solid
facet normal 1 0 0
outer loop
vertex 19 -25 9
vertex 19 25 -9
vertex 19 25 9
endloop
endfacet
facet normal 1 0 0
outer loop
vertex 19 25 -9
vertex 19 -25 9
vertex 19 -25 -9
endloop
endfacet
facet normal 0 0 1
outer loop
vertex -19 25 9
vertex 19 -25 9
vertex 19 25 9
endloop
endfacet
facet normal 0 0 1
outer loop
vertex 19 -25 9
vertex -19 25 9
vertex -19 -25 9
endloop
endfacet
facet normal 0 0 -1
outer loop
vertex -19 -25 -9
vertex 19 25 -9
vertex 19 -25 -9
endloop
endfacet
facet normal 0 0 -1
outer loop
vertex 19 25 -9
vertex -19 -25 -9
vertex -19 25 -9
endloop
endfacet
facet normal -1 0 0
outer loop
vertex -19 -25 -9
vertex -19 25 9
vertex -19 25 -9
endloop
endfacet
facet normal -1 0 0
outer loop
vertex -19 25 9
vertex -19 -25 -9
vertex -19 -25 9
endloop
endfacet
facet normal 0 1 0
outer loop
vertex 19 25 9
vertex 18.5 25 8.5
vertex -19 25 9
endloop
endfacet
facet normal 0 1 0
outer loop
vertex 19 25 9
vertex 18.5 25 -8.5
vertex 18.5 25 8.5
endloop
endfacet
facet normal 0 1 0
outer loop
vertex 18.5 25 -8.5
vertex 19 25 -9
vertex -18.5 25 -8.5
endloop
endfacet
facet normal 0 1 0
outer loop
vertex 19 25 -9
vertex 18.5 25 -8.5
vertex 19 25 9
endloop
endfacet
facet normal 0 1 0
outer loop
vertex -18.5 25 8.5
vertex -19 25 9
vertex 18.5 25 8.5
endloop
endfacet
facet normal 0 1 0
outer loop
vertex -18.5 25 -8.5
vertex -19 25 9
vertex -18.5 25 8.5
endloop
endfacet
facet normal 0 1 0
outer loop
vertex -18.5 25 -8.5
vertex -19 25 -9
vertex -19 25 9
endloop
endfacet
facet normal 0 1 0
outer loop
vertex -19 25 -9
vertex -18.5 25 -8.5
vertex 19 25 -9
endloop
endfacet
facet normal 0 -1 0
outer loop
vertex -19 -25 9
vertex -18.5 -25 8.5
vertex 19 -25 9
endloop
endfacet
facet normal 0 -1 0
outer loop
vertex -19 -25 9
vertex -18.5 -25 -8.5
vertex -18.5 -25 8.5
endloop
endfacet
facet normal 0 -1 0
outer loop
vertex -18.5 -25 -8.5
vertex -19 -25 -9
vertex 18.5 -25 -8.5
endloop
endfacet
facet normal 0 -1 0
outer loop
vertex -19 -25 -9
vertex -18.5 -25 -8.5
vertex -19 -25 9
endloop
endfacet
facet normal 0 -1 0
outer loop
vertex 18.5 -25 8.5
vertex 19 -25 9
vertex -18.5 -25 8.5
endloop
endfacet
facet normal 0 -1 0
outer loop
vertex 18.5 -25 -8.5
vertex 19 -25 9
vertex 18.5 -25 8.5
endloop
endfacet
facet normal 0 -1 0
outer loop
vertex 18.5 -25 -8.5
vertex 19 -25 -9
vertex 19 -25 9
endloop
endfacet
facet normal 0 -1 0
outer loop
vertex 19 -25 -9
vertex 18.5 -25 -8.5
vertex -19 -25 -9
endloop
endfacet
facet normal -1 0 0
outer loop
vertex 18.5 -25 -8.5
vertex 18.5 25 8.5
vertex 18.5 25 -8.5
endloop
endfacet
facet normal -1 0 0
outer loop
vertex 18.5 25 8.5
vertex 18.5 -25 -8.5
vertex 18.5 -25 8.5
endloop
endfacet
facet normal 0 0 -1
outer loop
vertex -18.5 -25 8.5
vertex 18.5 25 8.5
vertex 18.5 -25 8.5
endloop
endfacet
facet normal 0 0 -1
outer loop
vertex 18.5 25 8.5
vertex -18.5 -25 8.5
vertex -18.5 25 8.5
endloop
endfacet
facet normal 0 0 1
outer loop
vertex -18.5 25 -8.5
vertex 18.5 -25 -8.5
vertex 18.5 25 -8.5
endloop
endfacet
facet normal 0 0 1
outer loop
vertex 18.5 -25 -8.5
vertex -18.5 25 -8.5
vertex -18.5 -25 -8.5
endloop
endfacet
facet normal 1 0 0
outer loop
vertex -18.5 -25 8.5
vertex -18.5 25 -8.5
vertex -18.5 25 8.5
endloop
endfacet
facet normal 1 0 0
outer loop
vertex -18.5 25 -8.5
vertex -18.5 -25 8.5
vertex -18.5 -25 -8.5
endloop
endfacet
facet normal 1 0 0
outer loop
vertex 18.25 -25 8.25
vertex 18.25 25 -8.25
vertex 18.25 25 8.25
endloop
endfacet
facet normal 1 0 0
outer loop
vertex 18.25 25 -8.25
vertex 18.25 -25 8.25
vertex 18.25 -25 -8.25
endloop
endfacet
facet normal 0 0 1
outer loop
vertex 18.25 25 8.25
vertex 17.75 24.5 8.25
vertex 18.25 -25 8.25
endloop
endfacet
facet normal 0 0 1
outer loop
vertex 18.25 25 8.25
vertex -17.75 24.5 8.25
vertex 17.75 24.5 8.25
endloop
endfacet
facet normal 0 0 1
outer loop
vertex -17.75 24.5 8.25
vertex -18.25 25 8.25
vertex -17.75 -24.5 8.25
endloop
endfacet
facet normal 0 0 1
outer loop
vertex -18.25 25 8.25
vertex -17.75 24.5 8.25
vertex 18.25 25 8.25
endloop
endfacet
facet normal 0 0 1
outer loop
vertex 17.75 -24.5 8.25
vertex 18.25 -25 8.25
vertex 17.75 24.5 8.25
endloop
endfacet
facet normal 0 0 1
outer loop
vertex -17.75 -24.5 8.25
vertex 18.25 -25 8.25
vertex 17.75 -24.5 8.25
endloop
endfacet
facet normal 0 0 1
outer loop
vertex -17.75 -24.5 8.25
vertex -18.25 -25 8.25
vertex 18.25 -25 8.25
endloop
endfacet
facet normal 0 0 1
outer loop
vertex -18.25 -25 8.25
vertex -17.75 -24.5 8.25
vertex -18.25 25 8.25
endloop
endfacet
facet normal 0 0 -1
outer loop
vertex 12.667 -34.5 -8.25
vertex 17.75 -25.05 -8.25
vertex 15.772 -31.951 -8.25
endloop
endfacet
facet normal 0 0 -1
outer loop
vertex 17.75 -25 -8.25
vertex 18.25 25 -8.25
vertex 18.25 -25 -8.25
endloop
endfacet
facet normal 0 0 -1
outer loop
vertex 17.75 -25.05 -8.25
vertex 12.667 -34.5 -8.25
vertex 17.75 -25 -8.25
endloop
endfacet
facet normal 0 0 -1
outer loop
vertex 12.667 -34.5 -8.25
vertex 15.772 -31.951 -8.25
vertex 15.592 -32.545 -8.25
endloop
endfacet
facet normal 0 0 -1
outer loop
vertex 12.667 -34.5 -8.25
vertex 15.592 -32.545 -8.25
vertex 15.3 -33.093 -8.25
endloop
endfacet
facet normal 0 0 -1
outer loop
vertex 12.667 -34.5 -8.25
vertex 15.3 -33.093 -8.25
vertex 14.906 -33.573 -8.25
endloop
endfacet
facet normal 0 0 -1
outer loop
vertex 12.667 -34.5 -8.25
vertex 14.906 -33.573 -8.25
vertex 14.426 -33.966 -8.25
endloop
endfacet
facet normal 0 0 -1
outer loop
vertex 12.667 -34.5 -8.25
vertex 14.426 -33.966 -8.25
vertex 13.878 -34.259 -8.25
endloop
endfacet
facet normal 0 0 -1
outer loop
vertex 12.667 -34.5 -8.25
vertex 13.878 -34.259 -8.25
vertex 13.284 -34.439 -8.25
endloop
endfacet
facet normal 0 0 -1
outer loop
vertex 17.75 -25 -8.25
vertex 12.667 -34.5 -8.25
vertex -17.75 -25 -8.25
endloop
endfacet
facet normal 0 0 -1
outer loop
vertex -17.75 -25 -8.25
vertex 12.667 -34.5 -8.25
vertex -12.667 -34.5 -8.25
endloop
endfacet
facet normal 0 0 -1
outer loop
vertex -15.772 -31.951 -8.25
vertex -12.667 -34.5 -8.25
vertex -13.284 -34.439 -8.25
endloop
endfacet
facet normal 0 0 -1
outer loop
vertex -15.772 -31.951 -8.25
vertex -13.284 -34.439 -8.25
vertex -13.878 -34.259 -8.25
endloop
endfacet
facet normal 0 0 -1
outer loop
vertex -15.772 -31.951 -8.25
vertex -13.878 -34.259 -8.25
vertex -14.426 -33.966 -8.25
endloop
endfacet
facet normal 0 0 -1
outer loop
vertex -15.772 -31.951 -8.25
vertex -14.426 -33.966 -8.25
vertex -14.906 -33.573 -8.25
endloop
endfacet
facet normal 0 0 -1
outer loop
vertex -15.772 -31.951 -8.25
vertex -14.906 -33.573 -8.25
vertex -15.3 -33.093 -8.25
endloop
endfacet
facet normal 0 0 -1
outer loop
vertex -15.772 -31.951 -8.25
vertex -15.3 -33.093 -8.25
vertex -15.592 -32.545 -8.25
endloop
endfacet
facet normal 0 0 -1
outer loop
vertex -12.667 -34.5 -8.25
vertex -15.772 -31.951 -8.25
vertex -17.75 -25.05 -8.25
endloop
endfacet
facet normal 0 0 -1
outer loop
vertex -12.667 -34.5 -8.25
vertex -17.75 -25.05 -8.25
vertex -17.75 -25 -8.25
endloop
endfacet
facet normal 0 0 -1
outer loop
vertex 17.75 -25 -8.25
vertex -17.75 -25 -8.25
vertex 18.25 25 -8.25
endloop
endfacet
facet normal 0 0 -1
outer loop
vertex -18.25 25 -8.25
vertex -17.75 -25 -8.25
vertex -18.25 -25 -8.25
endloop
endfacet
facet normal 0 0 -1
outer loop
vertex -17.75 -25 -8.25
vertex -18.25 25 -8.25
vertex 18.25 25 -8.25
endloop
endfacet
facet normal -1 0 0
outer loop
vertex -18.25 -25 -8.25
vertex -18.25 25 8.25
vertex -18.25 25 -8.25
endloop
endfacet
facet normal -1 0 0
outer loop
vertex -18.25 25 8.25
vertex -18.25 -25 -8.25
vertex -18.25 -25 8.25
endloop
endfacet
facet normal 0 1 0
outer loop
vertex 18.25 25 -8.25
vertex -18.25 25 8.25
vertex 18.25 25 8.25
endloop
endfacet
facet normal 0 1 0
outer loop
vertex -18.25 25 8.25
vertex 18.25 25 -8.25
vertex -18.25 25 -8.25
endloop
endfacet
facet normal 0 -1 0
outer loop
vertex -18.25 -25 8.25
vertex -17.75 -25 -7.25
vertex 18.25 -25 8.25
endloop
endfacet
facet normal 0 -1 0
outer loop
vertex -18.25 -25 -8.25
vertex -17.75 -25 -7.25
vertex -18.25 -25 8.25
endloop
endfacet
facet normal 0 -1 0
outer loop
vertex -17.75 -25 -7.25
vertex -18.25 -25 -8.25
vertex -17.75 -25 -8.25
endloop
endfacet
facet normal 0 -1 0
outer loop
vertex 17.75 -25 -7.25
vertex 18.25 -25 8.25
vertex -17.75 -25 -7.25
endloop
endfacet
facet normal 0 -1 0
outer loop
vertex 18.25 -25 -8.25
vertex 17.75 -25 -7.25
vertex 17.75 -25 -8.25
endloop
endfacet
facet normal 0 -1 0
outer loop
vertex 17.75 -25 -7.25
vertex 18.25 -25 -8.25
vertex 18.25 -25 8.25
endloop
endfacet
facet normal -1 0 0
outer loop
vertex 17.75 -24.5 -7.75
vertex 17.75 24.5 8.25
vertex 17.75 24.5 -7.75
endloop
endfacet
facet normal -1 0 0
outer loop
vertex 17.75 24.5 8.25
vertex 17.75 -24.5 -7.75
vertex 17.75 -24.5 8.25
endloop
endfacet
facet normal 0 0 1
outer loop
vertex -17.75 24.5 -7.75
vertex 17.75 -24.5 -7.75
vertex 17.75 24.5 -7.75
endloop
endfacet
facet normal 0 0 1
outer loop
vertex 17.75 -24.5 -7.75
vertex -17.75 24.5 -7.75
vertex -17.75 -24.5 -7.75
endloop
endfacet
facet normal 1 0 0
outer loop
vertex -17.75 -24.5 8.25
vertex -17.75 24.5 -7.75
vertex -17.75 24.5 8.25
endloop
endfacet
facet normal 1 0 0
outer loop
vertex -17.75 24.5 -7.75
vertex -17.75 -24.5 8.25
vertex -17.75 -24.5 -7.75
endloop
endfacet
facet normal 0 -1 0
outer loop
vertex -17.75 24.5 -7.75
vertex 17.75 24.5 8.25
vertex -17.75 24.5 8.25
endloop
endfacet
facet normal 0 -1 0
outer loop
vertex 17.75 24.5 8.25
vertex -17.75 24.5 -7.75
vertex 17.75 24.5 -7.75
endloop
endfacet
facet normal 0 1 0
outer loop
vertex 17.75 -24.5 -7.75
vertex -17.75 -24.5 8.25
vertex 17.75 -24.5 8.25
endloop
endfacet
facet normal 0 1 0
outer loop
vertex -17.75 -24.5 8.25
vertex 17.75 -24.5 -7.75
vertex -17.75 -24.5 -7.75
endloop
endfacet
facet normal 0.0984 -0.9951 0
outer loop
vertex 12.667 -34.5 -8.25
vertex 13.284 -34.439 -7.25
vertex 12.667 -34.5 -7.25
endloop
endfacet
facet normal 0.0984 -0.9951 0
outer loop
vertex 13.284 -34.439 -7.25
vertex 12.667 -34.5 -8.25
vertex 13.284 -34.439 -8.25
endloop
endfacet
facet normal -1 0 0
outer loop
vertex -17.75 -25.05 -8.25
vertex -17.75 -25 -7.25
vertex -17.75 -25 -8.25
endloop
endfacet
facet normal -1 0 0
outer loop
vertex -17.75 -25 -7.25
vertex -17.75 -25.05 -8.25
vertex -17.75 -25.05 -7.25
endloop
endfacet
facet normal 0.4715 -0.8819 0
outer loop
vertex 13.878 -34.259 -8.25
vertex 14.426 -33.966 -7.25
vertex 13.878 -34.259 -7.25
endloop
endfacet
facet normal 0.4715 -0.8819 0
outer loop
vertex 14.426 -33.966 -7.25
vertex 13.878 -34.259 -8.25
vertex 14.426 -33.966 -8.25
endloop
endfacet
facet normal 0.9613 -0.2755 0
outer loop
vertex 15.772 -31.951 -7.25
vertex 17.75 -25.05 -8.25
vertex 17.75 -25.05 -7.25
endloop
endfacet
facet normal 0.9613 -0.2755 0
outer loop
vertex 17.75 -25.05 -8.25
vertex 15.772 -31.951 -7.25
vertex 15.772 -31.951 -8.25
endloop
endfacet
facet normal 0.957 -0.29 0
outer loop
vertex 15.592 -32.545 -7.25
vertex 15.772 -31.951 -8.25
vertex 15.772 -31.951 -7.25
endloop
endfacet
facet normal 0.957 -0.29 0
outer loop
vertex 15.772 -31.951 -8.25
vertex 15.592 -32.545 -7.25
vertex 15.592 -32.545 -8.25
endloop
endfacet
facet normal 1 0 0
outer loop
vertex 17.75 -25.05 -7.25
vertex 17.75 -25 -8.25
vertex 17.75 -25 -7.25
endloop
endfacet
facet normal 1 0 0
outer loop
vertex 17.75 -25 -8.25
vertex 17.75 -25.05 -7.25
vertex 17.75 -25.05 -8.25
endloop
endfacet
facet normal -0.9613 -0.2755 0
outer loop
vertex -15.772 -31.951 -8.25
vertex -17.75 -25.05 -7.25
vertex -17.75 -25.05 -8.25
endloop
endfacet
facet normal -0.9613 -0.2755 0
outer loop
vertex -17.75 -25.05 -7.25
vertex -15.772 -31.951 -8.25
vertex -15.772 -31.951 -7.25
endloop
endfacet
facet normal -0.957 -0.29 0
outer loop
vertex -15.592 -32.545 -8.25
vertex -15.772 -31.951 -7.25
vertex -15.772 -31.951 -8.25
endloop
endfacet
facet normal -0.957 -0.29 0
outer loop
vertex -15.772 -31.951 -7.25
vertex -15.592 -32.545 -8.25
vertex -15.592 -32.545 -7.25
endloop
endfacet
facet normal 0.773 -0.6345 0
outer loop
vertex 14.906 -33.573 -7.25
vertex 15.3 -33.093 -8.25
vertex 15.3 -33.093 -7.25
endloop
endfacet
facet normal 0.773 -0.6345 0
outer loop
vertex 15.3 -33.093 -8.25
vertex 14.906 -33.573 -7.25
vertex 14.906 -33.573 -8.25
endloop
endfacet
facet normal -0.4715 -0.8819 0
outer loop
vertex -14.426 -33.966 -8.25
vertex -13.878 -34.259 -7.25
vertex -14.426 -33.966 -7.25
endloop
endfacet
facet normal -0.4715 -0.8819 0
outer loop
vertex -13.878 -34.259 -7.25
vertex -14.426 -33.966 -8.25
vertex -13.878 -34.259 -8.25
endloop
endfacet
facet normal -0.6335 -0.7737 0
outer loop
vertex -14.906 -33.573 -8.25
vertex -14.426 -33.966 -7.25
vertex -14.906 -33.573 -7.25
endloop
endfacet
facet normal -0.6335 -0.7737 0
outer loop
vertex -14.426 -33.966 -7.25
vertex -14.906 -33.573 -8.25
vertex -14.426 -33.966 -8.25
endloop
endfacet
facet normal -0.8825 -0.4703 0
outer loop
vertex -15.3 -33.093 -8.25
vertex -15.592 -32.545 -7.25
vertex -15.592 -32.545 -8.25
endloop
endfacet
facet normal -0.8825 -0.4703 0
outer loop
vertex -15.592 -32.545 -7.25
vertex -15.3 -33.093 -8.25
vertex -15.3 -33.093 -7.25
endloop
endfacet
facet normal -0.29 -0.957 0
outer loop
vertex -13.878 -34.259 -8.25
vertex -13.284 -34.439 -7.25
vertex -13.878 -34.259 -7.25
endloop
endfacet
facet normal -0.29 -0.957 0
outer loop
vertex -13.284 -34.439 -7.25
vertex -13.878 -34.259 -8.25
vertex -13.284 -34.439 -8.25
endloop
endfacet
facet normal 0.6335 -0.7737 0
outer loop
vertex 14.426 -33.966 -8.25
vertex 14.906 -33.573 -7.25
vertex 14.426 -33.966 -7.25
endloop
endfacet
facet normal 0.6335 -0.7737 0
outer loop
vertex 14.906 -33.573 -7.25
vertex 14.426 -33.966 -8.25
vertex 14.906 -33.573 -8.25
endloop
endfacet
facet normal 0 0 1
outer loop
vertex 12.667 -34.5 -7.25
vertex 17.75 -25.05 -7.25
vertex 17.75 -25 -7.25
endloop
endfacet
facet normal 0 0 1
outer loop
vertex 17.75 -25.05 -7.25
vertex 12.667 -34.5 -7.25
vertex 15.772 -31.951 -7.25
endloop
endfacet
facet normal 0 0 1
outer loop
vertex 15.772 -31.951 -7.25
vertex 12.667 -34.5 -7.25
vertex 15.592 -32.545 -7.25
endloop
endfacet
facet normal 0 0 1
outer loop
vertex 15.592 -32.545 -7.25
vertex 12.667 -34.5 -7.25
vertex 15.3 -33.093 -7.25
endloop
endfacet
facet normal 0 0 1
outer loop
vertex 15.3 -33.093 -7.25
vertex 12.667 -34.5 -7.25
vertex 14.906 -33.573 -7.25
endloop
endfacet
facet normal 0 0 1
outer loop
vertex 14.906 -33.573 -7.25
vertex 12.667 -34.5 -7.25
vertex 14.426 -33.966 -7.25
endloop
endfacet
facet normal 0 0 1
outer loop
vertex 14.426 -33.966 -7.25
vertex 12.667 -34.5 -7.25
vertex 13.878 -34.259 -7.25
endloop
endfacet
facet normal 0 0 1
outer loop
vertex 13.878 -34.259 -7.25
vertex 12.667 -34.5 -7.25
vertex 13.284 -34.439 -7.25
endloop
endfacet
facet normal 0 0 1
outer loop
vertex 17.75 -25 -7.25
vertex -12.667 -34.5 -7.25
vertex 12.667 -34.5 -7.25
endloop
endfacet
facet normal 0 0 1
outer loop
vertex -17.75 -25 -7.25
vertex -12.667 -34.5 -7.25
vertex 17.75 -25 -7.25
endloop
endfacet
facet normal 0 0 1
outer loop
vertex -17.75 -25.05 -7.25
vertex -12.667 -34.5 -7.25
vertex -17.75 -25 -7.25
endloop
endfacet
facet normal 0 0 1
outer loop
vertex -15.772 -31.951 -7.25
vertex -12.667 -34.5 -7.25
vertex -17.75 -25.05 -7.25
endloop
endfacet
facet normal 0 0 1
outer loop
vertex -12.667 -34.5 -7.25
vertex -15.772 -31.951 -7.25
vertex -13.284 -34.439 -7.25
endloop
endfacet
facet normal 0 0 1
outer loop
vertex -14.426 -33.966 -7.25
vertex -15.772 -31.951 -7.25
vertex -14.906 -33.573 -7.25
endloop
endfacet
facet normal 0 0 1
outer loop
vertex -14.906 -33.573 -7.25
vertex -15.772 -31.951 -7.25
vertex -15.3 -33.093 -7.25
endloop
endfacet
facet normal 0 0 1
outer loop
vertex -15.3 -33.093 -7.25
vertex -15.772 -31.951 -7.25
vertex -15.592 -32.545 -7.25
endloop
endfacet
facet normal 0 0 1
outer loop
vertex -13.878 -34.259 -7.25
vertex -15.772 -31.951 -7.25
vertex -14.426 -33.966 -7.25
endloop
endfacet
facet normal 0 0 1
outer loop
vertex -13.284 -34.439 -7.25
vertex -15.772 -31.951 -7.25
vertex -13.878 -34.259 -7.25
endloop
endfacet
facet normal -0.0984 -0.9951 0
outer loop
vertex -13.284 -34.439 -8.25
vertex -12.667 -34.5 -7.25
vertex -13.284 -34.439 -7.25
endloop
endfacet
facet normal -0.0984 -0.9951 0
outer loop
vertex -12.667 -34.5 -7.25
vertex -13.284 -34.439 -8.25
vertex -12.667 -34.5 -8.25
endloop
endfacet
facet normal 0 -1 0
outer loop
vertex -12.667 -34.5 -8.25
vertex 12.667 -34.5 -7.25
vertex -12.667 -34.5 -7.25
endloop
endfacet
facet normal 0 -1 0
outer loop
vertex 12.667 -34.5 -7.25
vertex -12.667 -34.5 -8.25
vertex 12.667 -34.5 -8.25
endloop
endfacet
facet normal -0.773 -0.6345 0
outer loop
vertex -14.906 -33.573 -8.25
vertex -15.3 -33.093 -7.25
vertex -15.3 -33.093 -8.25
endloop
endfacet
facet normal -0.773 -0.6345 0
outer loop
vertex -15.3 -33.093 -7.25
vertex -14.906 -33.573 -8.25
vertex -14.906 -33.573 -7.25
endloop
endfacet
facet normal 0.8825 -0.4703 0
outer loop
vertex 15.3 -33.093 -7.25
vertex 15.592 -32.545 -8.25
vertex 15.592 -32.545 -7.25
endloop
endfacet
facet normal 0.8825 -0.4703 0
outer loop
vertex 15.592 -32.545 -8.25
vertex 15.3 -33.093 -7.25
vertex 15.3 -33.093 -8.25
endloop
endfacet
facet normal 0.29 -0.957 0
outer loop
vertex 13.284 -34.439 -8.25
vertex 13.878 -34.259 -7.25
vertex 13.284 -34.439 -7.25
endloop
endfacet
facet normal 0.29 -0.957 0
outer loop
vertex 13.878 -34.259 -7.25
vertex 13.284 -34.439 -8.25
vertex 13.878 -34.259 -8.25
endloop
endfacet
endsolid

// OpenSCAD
d = 50;
w = 38;
h = 18;
wth = 0.5;
dop = 0.5; //printer precision

translate([0,0,0])
difference() {
    cube([w,d,h], center=true);
    cube([w-wth*2,d+wth,h-wth*2], center=true);
}

translate([0,0,0])
union() {
    difference() {
        cube([w-wth*2-dop,d,h-wth*2-dop], center=true);
        translate([0,0,wth])
            cube([w-wth*4-dop,d-wth*2,h-wth*2-dop], center=true);
    }
    
    translate([0,-d/2,-(h-wth*2-dop)/2+wth])
    hull() {
        cube([w-wth*4-dop,0.1,wth*2], center=true);
        translate([-w/3,-w/6,0])
            cylinder(h=wth*2, d=w/6 ,$fn=32, center=true);
        translate([w/3,-w/6,0])
            cylinder(h=wth*2, d=w/6 ,$fn=32, center=true);
    }
}
